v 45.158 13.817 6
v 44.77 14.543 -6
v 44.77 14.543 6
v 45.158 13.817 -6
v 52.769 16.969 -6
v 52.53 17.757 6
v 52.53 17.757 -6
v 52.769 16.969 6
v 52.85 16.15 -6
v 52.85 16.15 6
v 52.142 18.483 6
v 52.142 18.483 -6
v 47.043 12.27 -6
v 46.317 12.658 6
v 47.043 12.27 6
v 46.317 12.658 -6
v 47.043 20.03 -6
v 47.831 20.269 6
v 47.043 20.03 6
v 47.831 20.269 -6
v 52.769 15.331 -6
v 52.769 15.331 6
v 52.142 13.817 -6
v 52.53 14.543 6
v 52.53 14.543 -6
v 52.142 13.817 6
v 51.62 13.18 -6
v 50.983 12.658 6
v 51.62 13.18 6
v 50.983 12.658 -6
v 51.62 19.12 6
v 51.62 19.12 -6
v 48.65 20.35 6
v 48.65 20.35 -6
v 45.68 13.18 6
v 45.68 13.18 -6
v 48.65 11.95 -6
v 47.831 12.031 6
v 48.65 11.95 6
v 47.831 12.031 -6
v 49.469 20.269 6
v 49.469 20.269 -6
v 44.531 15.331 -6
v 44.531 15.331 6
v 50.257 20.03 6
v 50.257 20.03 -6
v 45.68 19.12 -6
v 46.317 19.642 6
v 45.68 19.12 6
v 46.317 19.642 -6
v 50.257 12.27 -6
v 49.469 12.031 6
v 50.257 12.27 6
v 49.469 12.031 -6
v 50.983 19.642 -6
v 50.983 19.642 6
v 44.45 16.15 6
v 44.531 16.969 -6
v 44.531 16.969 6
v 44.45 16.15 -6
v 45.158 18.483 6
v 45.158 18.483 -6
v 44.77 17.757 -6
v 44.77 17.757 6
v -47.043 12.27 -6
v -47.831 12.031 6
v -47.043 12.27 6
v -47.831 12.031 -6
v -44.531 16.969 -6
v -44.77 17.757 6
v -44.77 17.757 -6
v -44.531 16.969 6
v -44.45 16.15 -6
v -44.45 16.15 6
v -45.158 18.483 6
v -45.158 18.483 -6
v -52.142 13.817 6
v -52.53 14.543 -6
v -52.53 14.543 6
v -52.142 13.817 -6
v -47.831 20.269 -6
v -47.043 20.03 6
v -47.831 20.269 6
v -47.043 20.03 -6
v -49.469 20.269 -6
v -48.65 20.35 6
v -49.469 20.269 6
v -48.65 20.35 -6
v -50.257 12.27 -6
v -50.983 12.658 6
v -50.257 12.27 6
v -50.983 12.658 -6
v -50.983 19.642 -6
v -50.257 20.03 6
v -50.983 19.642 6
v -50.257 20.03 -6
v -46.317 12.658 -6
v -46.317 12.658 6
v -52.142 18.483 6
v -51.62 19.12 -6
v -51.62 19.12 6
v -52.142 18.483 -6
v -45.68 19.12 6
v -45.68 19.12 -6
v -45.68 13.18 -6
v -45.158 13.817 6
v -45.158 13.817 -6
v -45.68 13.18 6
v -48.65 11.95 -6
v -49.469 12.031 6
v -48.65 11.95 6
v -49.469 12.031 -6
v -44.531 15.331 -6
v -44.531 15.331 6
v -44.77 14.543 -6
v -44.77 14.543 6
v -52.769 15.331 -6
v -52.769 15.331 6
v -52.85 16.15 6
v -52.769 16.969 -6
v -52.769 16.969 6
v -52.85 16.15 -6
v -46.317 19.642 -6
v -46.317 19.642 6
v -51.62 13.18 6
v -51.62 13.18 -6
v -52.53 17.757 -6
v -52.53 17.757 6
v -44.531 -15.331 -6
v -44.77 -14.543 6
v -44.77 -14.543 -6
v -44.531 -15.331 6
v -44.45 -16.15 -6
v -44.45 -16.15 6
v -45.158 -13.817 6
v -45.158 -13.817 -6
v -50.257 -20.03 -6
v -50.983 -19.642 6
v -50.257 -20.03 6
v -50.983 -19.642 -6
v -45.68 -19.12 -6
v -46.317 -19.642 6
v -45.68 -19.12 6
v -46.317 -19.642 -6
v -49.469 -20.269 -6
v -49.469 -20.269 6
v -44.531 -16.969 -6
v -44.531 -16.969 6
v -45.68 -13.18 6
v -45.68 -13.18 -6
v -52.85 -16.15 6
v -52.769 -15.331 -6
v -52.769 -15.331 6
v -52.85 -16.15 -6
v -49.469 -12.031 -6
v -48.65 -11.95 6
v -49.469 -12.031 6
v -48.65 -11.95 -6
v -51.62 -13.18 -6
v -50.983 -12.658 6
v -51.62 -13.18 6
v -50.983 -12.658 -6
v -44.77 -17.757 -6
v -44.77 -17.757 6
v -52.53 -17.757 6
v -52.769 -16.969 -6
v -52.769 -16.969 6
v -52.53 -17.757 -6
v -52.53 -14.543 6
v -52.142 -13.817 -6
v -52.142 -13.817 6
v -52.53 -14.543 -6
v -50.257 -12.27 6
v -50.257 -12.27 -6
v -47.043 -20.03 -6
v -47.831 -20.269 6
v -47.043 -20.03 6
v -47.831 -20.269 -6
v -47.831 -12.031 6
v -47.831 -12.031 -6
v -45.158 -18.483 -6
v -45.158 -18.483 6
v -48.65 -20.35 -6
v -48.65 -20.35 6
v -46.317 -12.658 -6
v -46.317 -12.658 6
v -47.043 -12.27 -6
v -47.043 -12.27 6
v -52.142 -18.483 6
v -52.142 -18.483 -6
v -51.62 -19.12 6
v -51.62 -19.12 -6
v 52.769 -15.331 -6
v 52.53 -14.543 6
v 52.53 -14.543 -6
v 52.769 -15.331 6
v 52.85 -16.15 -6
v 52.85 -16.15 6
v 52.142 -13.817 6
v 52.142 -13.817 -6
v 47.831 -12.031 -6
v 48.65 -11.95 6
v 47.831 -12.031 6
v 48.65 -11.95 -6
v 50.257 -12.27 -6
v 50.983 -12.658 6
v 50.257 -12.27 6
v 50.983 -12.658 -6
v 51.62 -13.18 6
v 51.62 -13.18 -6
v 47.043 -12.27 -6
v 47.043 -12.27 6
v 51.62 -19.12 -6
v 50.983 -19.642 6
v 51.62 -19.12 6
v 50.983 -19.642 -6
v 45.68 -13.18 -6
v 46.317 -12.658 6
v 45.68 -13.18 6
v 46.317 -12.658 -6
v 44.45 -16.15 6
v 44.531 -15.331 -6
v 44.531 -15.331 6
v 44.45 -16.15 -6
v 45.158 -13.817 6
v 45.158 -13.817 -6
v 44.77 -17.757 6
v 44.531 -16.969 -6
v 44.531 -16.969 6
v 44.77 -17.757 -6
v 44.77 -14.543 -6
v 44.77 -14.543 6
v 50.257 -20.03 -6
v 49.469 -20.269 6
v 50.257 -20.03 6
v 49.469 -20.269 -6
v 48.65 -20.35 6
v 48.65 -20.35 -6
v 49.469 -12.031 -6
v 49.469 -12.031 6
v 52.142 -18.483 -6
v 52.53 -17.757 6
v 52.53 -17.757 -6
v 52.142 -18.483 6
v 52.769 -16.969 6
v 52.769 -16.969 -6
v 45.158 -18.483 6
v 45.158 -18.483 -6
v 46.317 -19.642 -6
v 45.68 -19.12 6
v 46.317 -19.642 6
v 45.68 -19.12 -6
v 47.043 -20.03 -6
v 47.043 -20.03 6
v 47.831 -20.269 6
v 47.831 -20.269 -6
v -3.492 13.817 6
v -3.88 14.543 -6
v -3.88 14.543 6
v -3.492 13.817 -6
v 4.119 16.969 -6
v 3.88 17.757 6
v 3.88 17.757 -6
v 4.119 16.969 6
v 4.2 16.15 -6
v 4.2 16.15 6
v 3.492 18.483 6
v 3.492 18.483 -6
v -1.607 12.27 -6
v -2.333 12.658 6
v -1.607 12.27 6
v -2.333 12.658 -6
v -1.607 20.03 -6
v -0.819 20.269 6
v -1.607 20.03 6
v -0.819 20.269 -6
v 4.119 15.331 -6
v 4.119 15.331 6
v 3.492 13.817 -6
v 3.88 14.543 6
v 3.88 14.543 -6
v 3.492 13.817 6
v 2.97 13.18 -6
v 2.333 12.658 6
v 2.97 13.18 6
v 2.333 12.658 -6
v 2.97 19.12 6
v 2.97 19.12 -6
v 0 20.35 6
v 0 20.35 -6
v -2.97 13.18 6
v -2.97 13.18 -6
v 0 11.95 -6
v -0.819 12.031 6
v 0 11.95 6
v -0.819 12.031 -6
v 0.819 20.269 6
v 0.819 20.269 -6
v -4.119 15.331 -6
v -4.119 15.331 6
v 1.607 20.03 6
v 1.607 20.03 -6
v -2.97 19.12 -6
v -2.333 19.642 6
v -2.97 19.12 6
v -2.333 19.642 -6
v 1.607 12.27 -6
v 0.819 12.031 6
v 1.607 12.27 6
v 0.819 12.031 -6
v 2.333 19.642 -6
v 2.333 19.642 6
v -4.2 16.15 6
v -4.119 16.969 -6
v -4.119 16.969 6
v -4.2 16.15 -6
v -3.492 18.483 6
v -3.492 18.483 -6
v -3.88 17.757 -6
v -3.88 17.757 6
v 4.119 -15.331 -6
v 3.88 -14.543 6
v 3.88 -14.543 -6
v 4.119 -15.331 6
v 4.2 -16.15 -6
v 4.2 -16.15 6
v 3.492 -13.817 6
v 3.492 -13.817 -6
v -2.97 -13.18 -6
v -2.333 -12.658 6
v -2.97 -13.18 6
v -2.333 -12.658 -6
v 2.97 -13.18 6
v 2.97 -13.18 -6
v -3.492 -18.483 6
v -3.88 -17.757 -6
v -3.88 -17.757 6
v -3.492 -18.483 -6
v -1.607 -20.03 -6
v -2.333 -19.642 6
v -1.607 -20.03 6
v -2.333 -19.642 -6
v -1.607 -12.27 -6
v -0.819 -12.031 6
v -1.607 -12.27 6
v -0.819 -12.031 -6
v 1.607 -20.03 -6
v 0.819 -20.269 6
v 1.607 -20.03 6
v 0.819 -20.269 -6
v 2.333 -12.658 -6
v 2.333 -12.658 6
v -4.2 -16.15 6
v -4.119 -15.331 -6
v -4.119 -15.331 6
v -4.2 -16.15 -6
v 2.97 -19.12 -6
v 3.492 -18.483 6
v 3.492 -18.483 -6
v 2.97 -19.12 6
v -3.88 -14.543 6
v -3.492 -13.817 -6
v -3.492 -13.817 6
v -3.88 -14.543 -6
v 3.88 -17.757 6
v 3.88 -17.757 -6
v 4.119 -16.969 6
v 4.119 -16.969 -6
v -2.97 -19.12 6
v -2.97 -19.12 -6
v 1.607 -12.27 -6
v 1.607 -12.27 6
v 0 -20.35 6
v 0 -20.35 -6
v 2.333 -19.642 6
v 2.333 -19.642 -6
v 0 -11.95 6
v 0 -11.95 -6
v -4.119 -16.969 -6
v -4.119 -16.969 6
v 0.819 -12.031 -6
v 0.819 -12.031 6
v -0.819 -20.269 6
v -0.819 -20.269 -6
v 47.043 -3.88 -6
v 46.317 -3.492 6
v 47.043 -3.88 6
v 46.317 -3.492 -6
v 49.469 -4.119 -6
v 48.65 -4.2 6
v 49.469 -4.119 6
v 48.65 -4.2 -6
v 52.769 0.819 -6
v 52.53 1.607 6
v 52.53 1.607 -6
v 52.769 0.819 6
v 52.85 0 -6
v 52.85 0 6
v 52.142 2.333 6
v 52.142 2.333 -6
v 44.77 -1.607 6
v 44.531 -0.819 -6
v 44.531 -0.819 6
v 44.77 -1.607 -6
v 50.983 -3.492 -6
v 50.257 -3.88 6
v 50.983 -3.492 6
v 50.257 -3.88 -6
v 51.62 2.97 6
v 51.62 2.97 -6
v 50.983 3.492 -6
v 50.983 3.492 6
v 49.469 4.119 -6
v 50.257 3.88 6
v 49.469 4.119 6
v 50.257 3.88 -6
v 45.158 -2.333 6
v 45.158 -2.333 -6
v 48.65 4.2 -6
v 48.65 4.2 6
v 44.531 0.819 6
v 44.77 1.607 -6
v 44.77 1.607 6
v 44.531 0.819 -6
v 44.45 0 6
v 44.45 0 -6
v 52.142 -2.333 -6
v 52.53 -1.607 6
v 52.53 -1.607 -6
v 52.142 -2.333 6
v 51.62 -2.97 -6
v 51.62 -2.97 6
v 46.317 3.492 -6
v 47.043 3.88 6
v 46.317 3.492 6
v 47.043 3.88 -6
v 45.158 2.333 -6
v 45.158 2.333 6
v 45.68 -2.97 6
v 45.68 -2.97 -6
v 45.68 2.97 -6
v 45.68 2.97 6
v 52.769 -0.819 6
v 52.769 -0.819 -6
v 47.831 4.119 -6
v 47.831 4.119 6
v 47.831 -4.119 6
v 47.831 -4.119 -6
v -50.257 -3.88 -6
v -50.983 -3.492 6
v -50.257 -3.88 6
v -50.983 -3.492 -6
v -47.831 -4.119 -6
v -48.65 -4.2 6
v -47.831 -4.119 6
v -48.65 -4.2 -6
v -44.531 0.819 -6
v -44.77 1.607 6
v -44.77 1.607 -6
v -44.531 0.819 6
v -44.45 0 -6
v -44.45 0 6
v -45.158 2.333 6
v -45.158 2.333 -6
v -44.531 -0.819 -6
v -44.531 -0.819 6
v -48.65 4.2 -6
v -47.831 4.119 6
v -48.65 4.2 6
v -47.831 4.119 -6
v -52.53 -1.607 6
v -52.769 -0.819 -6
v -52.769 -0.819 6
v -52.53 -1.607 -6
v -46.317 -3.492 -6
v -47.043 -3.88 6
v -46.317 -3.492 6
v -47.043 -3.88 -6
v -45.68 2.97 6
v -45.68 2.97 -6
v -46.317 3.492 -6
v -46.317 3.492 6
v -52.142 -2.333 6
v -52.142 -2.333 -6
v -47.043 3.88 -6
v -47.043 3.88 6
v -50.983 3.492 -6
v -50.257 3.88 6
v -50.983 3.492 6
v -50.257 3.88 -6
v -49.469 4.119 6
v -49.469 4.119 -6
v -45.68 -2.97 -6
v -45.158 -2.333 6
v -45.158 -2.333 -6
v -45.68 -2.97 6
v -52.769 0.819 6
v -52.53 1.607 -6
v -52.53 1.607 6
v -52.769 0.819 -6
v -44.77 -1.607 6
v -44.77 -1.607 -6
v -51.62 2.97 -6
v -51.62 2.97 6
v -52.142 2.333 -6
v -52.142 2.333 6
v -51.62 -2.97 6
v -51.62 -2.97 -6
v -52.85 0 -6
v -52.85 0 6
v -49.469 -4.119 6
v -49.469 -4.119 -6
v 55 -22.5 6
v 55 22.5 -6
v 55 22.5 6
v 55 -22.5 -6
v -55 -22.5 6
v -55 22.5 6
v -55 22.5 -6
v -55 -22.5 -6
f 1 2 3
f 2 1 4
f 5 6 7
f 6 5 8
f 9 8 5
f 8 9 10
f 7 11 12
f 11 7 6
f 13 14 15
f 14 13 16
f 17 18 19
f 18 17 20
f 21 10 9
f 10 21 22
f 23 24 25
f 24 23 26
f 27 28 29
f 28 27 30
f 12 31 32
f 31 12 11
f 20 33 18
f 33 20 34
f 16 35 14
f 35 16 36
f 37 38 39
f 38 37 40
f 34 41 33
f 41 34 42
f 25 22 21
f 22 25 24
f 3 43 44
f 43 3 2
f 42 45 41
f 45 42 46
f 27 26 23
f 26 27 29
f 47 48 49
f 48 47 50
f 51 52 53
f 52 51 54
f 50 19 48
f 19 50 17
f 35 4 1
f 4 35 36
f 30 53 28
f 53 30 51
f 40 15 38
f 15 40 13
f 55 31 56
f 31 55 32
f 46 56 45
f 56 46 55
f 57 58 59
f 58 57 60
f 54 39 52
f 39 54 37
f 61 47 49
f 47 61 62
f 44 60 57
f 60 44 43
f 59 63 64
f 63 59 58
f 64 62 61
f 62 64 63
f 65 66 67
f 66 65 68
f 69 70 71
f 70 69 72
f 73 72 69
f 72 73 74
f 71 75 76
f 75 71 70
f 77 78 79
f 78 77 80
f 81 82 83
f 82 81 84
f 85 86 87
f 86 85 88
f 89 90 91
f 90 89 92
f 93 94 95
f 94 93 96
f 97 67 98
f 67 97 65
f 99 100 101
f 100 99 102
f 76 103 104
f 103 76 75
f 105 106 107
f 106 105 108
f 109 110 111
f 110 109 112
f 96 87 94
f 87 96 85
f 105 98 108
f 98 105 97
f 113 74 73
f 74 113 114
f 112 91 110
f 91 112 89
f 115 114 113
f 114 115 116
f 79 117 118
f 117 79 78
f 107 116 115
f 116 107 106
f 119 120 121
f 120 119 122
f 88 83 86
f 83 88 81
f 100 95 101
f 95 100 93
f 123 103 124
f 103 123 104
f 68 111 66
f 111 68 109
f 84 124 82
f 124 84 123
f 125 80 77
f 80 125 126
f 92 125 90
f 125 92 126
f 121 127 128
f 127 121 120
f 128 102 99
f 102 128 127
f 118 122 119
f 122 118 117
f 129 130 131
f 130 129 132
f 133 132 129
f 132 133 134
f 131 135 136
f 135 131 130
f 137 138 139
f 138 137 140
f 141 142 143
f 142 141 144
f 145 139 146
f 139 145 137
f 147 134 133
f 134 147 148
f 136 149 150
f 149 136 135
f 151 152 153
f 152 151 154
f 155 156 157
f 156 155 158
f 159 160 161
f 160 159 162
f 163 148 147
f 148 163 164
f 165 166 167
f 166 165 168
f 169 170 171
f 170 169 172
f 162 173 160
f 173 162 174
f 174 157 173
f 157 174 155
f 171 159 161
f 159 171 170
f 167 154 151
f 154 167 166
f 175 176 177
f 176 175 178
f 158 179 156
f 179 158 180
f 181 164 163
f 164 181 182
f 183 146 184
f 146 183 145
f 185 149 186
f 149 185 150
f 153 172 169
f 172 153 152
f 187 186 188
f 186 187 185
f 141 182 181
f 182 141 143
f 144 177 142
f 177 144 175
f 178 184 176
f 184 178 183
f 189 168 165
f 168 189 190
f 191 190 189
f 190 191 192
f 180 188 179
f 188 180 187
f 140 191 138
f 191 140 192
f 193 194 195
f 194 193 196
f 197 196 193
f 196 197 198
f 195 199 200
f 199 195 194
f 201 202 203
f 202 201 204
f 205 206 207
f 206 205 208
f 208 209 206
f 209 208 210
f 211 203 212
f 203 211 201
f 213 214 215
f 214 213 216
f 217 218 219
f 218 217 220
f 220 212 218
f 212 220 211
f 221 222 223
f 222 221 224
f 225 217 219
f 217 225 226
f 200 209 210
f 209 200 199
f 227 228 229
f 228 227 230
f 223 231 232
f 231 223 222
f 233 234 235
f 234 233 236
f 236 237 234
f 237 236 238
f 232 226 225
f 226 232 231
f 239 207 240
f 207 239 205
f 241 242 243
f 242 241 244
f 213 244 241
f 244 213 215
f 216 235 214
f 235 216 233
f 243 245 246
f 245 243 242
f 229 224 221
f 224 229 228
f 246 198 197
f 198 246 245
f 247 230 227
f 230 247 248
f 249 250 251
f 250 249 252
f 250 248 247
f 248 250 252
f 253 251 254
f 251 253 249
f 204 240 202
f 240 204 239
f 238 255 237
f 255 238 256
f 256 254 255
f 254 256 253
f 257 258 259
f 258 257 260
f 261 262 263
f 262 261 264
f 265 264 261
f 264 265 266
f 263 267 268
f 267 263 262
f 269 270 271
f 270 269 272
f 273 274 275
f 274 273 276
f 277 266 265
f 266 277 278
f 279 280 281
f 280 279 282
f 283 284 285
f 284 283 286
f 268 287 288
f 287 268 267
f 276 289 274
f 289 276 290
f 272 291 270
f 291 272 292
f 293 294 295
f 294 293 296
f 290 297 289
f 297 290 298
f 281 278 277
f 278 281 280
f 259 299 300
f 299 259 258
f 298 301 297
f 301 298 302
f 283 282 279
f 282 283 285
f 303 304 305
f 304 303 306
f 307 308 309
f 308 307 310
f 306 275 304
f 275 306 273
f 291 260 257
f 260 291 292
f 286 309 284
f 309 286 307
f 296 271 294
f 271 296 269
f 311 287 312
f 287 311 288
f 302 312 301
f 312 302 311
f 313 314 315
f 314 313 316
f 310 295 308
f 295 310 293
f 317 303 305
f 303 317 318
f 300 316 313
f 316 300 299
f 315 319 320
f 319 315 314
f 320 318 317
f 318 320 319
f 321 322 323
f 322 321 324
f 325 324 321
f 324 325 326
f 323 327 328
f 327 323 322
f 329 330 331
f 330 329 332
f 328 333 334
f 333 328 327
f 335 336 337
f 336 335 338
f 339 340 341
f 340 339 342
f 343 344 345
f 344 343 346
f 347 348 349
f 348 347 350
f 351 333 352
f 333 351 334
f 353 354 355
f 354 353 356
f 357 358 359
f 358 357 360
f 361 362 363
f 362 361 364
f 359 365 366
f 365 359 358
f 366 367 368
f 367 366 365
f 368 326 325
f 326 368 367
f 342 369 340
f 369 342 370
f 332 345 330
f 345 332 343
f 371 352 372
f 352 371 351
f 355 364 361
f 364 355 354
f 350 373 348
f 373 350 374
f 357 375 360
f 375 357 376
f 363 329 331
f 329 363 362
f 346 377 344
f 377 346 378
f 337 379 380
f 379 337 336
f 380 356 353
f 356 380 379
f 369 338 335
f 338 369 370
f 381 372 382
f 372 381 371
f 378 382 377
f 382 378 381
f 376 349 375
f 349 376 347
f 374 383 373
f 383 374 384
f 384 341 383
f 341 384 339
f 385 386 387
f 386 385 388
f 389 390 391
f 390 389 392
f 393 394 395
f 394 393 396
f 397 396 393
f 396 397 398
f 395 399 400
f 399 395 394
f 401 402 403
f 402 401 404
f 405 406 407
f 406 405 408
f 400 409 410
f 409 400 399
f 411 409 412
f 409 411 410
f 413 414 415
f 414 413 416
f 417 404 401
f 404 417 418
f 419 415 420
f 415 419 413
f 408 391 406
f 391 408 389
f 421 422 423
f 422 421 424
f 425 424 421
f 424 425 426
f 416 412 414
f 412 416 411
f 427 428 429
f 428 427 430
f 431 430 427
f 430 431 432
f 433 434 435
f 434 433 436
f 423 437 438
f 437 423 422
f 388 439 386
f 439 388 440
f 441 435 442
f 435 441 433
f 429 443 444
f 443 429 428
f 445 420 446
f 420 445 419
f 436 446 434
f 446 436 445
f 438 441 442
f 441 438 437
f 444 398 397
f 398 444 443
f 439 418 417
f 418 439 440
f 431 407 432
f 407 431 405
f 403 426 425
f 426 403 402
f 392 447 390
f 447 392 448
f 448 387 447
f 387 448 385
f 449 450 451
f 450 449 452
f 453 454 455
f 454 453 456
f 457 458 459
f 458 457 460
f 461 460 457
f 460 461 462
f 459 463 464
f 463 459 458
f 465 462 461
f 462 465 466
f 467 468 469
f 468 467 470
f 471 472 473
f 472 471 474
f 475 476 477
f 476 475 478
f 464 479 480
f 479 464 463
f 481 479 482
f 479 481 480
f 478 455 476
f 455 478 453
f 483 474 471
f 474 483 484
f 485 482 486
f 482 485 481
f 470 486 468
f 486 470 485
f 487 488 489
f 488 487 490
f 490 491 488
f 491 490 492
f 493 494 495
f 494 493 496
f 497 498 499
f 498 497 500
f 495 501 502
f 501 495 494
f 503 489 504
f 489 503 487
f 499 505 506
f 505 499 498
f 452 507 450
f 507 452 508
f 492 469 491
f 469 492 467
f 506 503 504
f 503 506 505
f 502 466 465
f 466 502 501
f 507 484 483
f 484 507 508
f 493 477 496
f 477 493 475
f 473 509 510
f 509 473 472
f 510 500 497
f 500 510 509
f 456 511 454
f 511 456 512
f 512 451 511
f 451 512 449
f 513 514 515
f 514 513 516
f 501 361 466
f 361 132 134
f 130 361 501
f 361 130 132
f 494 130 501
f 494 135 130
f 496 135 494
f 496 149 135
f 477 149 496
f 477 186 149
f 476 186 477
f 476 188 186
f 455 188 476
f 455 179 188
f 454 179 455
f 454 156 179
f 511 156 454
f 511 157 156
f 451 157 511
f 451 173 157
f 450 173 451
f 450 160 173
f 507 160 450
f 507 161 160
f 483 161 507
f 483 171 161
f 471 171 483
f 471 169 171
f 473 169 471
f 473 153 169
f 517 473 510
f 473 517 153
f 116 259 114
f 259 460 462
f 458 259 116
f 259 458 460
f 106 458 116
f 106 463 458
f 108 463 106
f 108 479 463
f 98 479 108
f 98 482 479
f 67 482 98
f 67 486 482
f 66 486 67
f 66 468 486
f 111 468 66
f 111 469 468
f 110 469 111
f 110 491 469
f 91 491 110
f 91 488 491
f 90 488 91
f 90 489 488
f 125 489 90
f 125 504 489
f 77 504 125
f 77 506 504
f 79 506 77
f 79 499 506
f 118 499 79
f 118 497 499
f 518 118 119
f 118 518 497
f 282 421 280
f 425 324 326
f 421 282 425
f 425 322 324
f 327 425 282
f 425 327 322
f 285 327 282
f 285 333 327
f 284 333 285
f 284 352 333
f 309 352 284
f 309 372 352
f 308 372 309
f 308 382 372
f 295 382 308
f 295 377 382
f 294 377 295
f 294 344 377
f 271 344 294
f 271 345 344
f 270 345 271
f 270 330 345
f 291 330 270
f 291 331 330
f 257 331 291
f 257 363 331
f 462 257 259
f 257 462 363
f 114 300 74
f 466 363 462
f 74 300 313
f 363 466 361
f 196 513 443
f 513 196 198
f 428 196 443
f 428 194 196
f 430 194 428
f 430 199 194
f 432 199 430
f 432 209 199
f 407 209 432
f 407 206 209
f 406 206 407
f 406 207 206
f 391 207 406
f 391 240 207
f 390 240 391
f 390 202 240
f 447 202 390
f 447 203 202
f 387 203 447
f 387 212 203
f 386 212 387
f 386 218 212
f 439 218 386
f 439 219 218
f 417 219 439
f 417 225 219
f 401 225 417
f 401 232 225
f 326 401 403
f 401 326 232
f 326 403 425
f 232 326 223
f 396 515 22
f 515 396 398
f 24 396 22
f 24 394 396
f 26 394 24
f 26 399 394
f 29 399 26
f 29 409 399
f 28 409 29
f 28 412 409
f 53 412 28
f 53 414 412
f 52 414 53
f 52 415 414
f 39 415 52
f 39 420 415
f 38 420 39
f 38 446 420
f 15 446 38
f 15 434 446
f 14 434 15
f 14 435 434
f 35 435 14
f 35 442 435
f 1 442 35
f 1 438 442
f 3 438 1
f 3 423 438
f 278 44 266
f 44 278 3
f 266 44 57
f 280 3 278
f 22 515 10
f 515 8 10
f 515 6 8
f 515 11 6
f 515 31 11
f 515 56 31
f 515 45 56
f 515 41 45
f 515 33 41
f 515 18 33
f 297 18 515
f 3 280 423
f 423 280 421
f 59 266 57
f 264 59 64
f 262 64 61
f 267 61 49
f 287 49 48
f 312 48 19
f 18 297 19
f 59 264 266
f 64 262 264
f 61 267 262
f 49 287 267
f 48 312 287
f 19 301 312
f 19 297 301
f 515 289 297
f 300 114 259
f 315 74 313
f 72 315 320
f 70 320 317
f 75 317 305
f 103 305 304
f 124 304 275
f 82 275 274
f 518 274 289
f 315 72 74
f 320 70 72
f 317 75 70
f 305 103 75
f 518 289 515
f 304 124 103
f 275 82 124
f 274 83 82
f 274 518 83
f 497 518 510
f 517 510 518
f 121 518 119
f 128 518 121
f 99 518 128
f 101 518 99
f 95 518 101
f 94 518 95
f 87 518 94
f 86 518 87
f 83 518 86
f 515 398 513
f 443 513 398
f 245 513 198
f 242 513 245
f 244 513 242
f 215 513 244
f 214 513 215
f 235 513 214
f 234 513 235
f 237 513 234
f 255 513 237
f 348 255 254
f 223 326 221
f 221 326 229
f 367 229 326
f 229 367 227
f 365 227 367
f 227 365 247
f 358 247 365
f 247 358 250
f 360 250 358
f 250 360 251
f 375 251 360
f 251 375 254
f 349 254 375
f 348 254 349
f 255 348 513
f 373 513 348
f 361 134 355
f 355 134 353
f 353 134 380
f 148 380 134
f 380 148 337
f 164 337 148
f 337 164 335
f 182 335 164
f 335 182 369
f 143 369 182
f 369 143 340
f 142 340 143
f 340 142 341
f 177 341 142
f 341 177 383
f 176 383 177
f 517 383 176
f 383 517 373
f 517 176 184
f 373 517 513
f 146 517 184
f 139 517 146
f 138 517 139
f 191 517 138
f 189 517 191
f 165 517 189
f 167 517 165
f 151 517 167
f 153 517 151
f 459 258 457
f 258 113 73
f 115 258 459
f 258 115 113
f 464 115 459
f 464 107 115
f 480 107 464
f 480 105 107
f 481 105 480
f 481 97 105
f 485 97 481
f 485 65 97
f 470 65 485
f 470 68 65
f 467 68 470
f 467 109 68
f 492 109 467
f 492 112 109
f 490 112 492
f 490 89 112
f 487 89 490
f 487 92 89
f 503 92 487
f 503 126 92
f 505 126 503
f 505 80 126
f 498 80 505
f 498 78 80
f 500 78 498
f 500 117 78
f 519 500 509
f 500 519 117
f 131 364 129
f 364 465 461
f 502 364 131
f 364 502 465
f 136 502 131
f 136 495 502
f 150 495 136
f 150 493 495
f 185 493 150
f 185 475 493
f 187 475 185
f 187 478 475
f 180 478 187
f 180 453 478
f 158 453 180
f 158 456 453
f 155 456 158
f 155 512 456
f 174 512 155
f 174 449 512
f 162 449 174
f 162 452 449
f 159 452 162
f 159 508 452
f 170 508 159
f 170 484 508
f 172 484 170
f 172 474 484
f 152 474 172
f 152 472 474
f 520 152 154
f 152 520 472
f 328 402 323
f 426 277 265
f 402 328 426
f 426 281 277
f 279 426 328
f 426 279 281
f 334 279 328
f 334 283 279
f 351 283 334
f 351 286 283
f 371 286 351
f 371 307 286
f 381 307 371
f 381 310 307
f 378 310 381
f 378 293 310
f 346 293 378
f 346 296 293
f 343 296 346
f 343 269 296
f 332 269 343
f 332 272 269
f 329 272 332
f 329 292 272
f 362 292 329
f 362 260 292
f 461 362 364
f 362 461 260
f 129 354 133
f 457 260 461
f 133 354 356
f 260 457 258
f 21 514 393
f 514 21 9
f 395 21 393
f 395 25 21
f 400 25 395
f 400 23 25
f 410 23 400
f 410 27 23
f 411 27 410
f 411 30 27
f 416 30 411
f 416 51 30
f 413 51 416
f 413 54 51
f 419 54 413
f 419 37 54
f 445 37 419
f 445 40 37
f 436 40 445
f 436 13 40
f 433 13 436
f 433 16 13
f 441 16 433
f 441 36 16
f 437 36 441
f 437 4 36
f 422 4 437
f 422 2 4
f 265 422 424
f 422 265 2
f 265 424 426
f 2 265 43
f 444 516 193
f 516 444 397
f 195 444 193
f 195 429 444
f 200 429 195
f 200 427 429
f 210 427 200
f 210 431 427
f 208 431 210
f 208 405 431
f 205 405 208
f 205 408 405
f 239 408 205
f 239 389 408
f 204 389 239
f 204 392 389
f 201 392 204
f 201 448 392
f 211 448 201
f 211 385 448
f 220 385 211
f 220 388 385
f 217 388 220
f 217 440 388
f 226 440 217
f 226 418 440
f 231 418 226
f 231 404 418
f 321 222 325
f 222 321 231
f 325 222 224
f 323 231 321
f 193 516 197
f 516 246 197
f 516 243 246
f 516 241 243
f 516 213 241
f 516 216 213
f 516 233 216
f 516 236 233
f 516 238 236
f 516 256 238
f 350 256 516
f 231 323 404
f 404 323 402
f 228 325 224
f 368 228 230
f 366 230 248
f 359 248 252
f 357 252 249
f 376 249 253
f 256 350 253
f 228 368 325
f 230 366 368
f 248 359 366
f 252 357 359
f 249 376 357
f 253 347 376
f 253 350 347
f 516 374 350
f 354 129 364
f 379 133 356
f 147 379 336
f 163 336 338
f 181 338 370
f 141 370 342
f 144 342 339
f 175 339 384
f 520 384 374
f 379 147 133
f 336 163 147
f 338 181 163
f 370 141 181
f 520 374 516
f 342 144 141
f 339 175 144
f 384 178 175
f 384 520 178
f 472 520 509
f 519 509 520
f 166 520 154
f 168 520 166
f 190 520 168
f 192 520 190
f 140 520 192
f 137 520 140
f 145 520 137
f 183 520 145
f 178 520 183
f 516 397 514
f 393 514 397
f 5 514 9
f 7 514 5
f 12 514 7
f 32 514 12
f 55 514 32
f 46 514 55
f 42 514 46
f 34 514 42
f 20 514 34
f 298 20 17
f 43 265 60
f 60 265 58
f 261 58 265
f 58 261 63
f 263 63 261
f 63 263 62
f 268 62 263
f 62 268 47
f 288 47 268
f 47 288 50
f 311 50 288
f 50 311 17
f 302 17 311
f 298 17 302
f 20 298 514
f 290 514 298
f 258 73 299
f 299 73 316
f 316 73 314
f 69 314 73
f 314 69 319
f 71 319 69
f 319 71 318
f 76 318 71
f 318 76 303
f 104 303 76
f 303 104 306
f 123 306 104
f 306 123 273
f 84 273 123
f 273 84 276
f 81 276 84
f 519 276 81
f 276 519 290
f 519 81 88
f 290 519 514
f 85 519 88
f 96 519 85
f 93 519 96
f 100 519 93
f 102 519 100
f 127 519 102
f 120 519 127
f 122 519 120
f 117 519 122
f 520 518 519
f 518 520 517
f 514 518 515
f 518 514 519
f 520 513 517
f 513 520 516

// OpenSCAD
$fn = 32;

// ----------------------------------------------------------------------
// Corner plate 110 x 45 x 12
// 8 holes, centres taken from the edge offset
// ----------------------------------------------------------------------

// --- parameters (mm) ---
plate = [110, 45, 12];  // overall size (x, y, z)
holes = 8;              // number of holes the drawing asks for
hole_d = 8.4;           // hole diameter
edge = 6.35;            // hole centre offset from the plate edge

// --- derived feature positions (mm) ---
corner_x = plate[0] / 2 - edge;  // = 48.65   corner hole X
corner_y = plate[1] / 2 - edge;  // = 16.15   corner hole Y
feature_centers = [
  [corner_x, corner_y],
  [-corner_x, corner_y],
  [-corner_x, -corner_y],
  [corner_x, -corner_y],
  [0, corner_y],
  [0, -corner_y],
  [corner_x, 0],
  [-corner_x, 0]
];   // hole centres the loop below drills

// plate outline, every hole drilled through with the same cutters
difference() {
  cube(plate, center = true);
  for (centre = feature_centers)
    translate([centre[0], centre[1], 0])
      cylinder(d = hole_d, h = plate[2] + 2, center = true);
}
